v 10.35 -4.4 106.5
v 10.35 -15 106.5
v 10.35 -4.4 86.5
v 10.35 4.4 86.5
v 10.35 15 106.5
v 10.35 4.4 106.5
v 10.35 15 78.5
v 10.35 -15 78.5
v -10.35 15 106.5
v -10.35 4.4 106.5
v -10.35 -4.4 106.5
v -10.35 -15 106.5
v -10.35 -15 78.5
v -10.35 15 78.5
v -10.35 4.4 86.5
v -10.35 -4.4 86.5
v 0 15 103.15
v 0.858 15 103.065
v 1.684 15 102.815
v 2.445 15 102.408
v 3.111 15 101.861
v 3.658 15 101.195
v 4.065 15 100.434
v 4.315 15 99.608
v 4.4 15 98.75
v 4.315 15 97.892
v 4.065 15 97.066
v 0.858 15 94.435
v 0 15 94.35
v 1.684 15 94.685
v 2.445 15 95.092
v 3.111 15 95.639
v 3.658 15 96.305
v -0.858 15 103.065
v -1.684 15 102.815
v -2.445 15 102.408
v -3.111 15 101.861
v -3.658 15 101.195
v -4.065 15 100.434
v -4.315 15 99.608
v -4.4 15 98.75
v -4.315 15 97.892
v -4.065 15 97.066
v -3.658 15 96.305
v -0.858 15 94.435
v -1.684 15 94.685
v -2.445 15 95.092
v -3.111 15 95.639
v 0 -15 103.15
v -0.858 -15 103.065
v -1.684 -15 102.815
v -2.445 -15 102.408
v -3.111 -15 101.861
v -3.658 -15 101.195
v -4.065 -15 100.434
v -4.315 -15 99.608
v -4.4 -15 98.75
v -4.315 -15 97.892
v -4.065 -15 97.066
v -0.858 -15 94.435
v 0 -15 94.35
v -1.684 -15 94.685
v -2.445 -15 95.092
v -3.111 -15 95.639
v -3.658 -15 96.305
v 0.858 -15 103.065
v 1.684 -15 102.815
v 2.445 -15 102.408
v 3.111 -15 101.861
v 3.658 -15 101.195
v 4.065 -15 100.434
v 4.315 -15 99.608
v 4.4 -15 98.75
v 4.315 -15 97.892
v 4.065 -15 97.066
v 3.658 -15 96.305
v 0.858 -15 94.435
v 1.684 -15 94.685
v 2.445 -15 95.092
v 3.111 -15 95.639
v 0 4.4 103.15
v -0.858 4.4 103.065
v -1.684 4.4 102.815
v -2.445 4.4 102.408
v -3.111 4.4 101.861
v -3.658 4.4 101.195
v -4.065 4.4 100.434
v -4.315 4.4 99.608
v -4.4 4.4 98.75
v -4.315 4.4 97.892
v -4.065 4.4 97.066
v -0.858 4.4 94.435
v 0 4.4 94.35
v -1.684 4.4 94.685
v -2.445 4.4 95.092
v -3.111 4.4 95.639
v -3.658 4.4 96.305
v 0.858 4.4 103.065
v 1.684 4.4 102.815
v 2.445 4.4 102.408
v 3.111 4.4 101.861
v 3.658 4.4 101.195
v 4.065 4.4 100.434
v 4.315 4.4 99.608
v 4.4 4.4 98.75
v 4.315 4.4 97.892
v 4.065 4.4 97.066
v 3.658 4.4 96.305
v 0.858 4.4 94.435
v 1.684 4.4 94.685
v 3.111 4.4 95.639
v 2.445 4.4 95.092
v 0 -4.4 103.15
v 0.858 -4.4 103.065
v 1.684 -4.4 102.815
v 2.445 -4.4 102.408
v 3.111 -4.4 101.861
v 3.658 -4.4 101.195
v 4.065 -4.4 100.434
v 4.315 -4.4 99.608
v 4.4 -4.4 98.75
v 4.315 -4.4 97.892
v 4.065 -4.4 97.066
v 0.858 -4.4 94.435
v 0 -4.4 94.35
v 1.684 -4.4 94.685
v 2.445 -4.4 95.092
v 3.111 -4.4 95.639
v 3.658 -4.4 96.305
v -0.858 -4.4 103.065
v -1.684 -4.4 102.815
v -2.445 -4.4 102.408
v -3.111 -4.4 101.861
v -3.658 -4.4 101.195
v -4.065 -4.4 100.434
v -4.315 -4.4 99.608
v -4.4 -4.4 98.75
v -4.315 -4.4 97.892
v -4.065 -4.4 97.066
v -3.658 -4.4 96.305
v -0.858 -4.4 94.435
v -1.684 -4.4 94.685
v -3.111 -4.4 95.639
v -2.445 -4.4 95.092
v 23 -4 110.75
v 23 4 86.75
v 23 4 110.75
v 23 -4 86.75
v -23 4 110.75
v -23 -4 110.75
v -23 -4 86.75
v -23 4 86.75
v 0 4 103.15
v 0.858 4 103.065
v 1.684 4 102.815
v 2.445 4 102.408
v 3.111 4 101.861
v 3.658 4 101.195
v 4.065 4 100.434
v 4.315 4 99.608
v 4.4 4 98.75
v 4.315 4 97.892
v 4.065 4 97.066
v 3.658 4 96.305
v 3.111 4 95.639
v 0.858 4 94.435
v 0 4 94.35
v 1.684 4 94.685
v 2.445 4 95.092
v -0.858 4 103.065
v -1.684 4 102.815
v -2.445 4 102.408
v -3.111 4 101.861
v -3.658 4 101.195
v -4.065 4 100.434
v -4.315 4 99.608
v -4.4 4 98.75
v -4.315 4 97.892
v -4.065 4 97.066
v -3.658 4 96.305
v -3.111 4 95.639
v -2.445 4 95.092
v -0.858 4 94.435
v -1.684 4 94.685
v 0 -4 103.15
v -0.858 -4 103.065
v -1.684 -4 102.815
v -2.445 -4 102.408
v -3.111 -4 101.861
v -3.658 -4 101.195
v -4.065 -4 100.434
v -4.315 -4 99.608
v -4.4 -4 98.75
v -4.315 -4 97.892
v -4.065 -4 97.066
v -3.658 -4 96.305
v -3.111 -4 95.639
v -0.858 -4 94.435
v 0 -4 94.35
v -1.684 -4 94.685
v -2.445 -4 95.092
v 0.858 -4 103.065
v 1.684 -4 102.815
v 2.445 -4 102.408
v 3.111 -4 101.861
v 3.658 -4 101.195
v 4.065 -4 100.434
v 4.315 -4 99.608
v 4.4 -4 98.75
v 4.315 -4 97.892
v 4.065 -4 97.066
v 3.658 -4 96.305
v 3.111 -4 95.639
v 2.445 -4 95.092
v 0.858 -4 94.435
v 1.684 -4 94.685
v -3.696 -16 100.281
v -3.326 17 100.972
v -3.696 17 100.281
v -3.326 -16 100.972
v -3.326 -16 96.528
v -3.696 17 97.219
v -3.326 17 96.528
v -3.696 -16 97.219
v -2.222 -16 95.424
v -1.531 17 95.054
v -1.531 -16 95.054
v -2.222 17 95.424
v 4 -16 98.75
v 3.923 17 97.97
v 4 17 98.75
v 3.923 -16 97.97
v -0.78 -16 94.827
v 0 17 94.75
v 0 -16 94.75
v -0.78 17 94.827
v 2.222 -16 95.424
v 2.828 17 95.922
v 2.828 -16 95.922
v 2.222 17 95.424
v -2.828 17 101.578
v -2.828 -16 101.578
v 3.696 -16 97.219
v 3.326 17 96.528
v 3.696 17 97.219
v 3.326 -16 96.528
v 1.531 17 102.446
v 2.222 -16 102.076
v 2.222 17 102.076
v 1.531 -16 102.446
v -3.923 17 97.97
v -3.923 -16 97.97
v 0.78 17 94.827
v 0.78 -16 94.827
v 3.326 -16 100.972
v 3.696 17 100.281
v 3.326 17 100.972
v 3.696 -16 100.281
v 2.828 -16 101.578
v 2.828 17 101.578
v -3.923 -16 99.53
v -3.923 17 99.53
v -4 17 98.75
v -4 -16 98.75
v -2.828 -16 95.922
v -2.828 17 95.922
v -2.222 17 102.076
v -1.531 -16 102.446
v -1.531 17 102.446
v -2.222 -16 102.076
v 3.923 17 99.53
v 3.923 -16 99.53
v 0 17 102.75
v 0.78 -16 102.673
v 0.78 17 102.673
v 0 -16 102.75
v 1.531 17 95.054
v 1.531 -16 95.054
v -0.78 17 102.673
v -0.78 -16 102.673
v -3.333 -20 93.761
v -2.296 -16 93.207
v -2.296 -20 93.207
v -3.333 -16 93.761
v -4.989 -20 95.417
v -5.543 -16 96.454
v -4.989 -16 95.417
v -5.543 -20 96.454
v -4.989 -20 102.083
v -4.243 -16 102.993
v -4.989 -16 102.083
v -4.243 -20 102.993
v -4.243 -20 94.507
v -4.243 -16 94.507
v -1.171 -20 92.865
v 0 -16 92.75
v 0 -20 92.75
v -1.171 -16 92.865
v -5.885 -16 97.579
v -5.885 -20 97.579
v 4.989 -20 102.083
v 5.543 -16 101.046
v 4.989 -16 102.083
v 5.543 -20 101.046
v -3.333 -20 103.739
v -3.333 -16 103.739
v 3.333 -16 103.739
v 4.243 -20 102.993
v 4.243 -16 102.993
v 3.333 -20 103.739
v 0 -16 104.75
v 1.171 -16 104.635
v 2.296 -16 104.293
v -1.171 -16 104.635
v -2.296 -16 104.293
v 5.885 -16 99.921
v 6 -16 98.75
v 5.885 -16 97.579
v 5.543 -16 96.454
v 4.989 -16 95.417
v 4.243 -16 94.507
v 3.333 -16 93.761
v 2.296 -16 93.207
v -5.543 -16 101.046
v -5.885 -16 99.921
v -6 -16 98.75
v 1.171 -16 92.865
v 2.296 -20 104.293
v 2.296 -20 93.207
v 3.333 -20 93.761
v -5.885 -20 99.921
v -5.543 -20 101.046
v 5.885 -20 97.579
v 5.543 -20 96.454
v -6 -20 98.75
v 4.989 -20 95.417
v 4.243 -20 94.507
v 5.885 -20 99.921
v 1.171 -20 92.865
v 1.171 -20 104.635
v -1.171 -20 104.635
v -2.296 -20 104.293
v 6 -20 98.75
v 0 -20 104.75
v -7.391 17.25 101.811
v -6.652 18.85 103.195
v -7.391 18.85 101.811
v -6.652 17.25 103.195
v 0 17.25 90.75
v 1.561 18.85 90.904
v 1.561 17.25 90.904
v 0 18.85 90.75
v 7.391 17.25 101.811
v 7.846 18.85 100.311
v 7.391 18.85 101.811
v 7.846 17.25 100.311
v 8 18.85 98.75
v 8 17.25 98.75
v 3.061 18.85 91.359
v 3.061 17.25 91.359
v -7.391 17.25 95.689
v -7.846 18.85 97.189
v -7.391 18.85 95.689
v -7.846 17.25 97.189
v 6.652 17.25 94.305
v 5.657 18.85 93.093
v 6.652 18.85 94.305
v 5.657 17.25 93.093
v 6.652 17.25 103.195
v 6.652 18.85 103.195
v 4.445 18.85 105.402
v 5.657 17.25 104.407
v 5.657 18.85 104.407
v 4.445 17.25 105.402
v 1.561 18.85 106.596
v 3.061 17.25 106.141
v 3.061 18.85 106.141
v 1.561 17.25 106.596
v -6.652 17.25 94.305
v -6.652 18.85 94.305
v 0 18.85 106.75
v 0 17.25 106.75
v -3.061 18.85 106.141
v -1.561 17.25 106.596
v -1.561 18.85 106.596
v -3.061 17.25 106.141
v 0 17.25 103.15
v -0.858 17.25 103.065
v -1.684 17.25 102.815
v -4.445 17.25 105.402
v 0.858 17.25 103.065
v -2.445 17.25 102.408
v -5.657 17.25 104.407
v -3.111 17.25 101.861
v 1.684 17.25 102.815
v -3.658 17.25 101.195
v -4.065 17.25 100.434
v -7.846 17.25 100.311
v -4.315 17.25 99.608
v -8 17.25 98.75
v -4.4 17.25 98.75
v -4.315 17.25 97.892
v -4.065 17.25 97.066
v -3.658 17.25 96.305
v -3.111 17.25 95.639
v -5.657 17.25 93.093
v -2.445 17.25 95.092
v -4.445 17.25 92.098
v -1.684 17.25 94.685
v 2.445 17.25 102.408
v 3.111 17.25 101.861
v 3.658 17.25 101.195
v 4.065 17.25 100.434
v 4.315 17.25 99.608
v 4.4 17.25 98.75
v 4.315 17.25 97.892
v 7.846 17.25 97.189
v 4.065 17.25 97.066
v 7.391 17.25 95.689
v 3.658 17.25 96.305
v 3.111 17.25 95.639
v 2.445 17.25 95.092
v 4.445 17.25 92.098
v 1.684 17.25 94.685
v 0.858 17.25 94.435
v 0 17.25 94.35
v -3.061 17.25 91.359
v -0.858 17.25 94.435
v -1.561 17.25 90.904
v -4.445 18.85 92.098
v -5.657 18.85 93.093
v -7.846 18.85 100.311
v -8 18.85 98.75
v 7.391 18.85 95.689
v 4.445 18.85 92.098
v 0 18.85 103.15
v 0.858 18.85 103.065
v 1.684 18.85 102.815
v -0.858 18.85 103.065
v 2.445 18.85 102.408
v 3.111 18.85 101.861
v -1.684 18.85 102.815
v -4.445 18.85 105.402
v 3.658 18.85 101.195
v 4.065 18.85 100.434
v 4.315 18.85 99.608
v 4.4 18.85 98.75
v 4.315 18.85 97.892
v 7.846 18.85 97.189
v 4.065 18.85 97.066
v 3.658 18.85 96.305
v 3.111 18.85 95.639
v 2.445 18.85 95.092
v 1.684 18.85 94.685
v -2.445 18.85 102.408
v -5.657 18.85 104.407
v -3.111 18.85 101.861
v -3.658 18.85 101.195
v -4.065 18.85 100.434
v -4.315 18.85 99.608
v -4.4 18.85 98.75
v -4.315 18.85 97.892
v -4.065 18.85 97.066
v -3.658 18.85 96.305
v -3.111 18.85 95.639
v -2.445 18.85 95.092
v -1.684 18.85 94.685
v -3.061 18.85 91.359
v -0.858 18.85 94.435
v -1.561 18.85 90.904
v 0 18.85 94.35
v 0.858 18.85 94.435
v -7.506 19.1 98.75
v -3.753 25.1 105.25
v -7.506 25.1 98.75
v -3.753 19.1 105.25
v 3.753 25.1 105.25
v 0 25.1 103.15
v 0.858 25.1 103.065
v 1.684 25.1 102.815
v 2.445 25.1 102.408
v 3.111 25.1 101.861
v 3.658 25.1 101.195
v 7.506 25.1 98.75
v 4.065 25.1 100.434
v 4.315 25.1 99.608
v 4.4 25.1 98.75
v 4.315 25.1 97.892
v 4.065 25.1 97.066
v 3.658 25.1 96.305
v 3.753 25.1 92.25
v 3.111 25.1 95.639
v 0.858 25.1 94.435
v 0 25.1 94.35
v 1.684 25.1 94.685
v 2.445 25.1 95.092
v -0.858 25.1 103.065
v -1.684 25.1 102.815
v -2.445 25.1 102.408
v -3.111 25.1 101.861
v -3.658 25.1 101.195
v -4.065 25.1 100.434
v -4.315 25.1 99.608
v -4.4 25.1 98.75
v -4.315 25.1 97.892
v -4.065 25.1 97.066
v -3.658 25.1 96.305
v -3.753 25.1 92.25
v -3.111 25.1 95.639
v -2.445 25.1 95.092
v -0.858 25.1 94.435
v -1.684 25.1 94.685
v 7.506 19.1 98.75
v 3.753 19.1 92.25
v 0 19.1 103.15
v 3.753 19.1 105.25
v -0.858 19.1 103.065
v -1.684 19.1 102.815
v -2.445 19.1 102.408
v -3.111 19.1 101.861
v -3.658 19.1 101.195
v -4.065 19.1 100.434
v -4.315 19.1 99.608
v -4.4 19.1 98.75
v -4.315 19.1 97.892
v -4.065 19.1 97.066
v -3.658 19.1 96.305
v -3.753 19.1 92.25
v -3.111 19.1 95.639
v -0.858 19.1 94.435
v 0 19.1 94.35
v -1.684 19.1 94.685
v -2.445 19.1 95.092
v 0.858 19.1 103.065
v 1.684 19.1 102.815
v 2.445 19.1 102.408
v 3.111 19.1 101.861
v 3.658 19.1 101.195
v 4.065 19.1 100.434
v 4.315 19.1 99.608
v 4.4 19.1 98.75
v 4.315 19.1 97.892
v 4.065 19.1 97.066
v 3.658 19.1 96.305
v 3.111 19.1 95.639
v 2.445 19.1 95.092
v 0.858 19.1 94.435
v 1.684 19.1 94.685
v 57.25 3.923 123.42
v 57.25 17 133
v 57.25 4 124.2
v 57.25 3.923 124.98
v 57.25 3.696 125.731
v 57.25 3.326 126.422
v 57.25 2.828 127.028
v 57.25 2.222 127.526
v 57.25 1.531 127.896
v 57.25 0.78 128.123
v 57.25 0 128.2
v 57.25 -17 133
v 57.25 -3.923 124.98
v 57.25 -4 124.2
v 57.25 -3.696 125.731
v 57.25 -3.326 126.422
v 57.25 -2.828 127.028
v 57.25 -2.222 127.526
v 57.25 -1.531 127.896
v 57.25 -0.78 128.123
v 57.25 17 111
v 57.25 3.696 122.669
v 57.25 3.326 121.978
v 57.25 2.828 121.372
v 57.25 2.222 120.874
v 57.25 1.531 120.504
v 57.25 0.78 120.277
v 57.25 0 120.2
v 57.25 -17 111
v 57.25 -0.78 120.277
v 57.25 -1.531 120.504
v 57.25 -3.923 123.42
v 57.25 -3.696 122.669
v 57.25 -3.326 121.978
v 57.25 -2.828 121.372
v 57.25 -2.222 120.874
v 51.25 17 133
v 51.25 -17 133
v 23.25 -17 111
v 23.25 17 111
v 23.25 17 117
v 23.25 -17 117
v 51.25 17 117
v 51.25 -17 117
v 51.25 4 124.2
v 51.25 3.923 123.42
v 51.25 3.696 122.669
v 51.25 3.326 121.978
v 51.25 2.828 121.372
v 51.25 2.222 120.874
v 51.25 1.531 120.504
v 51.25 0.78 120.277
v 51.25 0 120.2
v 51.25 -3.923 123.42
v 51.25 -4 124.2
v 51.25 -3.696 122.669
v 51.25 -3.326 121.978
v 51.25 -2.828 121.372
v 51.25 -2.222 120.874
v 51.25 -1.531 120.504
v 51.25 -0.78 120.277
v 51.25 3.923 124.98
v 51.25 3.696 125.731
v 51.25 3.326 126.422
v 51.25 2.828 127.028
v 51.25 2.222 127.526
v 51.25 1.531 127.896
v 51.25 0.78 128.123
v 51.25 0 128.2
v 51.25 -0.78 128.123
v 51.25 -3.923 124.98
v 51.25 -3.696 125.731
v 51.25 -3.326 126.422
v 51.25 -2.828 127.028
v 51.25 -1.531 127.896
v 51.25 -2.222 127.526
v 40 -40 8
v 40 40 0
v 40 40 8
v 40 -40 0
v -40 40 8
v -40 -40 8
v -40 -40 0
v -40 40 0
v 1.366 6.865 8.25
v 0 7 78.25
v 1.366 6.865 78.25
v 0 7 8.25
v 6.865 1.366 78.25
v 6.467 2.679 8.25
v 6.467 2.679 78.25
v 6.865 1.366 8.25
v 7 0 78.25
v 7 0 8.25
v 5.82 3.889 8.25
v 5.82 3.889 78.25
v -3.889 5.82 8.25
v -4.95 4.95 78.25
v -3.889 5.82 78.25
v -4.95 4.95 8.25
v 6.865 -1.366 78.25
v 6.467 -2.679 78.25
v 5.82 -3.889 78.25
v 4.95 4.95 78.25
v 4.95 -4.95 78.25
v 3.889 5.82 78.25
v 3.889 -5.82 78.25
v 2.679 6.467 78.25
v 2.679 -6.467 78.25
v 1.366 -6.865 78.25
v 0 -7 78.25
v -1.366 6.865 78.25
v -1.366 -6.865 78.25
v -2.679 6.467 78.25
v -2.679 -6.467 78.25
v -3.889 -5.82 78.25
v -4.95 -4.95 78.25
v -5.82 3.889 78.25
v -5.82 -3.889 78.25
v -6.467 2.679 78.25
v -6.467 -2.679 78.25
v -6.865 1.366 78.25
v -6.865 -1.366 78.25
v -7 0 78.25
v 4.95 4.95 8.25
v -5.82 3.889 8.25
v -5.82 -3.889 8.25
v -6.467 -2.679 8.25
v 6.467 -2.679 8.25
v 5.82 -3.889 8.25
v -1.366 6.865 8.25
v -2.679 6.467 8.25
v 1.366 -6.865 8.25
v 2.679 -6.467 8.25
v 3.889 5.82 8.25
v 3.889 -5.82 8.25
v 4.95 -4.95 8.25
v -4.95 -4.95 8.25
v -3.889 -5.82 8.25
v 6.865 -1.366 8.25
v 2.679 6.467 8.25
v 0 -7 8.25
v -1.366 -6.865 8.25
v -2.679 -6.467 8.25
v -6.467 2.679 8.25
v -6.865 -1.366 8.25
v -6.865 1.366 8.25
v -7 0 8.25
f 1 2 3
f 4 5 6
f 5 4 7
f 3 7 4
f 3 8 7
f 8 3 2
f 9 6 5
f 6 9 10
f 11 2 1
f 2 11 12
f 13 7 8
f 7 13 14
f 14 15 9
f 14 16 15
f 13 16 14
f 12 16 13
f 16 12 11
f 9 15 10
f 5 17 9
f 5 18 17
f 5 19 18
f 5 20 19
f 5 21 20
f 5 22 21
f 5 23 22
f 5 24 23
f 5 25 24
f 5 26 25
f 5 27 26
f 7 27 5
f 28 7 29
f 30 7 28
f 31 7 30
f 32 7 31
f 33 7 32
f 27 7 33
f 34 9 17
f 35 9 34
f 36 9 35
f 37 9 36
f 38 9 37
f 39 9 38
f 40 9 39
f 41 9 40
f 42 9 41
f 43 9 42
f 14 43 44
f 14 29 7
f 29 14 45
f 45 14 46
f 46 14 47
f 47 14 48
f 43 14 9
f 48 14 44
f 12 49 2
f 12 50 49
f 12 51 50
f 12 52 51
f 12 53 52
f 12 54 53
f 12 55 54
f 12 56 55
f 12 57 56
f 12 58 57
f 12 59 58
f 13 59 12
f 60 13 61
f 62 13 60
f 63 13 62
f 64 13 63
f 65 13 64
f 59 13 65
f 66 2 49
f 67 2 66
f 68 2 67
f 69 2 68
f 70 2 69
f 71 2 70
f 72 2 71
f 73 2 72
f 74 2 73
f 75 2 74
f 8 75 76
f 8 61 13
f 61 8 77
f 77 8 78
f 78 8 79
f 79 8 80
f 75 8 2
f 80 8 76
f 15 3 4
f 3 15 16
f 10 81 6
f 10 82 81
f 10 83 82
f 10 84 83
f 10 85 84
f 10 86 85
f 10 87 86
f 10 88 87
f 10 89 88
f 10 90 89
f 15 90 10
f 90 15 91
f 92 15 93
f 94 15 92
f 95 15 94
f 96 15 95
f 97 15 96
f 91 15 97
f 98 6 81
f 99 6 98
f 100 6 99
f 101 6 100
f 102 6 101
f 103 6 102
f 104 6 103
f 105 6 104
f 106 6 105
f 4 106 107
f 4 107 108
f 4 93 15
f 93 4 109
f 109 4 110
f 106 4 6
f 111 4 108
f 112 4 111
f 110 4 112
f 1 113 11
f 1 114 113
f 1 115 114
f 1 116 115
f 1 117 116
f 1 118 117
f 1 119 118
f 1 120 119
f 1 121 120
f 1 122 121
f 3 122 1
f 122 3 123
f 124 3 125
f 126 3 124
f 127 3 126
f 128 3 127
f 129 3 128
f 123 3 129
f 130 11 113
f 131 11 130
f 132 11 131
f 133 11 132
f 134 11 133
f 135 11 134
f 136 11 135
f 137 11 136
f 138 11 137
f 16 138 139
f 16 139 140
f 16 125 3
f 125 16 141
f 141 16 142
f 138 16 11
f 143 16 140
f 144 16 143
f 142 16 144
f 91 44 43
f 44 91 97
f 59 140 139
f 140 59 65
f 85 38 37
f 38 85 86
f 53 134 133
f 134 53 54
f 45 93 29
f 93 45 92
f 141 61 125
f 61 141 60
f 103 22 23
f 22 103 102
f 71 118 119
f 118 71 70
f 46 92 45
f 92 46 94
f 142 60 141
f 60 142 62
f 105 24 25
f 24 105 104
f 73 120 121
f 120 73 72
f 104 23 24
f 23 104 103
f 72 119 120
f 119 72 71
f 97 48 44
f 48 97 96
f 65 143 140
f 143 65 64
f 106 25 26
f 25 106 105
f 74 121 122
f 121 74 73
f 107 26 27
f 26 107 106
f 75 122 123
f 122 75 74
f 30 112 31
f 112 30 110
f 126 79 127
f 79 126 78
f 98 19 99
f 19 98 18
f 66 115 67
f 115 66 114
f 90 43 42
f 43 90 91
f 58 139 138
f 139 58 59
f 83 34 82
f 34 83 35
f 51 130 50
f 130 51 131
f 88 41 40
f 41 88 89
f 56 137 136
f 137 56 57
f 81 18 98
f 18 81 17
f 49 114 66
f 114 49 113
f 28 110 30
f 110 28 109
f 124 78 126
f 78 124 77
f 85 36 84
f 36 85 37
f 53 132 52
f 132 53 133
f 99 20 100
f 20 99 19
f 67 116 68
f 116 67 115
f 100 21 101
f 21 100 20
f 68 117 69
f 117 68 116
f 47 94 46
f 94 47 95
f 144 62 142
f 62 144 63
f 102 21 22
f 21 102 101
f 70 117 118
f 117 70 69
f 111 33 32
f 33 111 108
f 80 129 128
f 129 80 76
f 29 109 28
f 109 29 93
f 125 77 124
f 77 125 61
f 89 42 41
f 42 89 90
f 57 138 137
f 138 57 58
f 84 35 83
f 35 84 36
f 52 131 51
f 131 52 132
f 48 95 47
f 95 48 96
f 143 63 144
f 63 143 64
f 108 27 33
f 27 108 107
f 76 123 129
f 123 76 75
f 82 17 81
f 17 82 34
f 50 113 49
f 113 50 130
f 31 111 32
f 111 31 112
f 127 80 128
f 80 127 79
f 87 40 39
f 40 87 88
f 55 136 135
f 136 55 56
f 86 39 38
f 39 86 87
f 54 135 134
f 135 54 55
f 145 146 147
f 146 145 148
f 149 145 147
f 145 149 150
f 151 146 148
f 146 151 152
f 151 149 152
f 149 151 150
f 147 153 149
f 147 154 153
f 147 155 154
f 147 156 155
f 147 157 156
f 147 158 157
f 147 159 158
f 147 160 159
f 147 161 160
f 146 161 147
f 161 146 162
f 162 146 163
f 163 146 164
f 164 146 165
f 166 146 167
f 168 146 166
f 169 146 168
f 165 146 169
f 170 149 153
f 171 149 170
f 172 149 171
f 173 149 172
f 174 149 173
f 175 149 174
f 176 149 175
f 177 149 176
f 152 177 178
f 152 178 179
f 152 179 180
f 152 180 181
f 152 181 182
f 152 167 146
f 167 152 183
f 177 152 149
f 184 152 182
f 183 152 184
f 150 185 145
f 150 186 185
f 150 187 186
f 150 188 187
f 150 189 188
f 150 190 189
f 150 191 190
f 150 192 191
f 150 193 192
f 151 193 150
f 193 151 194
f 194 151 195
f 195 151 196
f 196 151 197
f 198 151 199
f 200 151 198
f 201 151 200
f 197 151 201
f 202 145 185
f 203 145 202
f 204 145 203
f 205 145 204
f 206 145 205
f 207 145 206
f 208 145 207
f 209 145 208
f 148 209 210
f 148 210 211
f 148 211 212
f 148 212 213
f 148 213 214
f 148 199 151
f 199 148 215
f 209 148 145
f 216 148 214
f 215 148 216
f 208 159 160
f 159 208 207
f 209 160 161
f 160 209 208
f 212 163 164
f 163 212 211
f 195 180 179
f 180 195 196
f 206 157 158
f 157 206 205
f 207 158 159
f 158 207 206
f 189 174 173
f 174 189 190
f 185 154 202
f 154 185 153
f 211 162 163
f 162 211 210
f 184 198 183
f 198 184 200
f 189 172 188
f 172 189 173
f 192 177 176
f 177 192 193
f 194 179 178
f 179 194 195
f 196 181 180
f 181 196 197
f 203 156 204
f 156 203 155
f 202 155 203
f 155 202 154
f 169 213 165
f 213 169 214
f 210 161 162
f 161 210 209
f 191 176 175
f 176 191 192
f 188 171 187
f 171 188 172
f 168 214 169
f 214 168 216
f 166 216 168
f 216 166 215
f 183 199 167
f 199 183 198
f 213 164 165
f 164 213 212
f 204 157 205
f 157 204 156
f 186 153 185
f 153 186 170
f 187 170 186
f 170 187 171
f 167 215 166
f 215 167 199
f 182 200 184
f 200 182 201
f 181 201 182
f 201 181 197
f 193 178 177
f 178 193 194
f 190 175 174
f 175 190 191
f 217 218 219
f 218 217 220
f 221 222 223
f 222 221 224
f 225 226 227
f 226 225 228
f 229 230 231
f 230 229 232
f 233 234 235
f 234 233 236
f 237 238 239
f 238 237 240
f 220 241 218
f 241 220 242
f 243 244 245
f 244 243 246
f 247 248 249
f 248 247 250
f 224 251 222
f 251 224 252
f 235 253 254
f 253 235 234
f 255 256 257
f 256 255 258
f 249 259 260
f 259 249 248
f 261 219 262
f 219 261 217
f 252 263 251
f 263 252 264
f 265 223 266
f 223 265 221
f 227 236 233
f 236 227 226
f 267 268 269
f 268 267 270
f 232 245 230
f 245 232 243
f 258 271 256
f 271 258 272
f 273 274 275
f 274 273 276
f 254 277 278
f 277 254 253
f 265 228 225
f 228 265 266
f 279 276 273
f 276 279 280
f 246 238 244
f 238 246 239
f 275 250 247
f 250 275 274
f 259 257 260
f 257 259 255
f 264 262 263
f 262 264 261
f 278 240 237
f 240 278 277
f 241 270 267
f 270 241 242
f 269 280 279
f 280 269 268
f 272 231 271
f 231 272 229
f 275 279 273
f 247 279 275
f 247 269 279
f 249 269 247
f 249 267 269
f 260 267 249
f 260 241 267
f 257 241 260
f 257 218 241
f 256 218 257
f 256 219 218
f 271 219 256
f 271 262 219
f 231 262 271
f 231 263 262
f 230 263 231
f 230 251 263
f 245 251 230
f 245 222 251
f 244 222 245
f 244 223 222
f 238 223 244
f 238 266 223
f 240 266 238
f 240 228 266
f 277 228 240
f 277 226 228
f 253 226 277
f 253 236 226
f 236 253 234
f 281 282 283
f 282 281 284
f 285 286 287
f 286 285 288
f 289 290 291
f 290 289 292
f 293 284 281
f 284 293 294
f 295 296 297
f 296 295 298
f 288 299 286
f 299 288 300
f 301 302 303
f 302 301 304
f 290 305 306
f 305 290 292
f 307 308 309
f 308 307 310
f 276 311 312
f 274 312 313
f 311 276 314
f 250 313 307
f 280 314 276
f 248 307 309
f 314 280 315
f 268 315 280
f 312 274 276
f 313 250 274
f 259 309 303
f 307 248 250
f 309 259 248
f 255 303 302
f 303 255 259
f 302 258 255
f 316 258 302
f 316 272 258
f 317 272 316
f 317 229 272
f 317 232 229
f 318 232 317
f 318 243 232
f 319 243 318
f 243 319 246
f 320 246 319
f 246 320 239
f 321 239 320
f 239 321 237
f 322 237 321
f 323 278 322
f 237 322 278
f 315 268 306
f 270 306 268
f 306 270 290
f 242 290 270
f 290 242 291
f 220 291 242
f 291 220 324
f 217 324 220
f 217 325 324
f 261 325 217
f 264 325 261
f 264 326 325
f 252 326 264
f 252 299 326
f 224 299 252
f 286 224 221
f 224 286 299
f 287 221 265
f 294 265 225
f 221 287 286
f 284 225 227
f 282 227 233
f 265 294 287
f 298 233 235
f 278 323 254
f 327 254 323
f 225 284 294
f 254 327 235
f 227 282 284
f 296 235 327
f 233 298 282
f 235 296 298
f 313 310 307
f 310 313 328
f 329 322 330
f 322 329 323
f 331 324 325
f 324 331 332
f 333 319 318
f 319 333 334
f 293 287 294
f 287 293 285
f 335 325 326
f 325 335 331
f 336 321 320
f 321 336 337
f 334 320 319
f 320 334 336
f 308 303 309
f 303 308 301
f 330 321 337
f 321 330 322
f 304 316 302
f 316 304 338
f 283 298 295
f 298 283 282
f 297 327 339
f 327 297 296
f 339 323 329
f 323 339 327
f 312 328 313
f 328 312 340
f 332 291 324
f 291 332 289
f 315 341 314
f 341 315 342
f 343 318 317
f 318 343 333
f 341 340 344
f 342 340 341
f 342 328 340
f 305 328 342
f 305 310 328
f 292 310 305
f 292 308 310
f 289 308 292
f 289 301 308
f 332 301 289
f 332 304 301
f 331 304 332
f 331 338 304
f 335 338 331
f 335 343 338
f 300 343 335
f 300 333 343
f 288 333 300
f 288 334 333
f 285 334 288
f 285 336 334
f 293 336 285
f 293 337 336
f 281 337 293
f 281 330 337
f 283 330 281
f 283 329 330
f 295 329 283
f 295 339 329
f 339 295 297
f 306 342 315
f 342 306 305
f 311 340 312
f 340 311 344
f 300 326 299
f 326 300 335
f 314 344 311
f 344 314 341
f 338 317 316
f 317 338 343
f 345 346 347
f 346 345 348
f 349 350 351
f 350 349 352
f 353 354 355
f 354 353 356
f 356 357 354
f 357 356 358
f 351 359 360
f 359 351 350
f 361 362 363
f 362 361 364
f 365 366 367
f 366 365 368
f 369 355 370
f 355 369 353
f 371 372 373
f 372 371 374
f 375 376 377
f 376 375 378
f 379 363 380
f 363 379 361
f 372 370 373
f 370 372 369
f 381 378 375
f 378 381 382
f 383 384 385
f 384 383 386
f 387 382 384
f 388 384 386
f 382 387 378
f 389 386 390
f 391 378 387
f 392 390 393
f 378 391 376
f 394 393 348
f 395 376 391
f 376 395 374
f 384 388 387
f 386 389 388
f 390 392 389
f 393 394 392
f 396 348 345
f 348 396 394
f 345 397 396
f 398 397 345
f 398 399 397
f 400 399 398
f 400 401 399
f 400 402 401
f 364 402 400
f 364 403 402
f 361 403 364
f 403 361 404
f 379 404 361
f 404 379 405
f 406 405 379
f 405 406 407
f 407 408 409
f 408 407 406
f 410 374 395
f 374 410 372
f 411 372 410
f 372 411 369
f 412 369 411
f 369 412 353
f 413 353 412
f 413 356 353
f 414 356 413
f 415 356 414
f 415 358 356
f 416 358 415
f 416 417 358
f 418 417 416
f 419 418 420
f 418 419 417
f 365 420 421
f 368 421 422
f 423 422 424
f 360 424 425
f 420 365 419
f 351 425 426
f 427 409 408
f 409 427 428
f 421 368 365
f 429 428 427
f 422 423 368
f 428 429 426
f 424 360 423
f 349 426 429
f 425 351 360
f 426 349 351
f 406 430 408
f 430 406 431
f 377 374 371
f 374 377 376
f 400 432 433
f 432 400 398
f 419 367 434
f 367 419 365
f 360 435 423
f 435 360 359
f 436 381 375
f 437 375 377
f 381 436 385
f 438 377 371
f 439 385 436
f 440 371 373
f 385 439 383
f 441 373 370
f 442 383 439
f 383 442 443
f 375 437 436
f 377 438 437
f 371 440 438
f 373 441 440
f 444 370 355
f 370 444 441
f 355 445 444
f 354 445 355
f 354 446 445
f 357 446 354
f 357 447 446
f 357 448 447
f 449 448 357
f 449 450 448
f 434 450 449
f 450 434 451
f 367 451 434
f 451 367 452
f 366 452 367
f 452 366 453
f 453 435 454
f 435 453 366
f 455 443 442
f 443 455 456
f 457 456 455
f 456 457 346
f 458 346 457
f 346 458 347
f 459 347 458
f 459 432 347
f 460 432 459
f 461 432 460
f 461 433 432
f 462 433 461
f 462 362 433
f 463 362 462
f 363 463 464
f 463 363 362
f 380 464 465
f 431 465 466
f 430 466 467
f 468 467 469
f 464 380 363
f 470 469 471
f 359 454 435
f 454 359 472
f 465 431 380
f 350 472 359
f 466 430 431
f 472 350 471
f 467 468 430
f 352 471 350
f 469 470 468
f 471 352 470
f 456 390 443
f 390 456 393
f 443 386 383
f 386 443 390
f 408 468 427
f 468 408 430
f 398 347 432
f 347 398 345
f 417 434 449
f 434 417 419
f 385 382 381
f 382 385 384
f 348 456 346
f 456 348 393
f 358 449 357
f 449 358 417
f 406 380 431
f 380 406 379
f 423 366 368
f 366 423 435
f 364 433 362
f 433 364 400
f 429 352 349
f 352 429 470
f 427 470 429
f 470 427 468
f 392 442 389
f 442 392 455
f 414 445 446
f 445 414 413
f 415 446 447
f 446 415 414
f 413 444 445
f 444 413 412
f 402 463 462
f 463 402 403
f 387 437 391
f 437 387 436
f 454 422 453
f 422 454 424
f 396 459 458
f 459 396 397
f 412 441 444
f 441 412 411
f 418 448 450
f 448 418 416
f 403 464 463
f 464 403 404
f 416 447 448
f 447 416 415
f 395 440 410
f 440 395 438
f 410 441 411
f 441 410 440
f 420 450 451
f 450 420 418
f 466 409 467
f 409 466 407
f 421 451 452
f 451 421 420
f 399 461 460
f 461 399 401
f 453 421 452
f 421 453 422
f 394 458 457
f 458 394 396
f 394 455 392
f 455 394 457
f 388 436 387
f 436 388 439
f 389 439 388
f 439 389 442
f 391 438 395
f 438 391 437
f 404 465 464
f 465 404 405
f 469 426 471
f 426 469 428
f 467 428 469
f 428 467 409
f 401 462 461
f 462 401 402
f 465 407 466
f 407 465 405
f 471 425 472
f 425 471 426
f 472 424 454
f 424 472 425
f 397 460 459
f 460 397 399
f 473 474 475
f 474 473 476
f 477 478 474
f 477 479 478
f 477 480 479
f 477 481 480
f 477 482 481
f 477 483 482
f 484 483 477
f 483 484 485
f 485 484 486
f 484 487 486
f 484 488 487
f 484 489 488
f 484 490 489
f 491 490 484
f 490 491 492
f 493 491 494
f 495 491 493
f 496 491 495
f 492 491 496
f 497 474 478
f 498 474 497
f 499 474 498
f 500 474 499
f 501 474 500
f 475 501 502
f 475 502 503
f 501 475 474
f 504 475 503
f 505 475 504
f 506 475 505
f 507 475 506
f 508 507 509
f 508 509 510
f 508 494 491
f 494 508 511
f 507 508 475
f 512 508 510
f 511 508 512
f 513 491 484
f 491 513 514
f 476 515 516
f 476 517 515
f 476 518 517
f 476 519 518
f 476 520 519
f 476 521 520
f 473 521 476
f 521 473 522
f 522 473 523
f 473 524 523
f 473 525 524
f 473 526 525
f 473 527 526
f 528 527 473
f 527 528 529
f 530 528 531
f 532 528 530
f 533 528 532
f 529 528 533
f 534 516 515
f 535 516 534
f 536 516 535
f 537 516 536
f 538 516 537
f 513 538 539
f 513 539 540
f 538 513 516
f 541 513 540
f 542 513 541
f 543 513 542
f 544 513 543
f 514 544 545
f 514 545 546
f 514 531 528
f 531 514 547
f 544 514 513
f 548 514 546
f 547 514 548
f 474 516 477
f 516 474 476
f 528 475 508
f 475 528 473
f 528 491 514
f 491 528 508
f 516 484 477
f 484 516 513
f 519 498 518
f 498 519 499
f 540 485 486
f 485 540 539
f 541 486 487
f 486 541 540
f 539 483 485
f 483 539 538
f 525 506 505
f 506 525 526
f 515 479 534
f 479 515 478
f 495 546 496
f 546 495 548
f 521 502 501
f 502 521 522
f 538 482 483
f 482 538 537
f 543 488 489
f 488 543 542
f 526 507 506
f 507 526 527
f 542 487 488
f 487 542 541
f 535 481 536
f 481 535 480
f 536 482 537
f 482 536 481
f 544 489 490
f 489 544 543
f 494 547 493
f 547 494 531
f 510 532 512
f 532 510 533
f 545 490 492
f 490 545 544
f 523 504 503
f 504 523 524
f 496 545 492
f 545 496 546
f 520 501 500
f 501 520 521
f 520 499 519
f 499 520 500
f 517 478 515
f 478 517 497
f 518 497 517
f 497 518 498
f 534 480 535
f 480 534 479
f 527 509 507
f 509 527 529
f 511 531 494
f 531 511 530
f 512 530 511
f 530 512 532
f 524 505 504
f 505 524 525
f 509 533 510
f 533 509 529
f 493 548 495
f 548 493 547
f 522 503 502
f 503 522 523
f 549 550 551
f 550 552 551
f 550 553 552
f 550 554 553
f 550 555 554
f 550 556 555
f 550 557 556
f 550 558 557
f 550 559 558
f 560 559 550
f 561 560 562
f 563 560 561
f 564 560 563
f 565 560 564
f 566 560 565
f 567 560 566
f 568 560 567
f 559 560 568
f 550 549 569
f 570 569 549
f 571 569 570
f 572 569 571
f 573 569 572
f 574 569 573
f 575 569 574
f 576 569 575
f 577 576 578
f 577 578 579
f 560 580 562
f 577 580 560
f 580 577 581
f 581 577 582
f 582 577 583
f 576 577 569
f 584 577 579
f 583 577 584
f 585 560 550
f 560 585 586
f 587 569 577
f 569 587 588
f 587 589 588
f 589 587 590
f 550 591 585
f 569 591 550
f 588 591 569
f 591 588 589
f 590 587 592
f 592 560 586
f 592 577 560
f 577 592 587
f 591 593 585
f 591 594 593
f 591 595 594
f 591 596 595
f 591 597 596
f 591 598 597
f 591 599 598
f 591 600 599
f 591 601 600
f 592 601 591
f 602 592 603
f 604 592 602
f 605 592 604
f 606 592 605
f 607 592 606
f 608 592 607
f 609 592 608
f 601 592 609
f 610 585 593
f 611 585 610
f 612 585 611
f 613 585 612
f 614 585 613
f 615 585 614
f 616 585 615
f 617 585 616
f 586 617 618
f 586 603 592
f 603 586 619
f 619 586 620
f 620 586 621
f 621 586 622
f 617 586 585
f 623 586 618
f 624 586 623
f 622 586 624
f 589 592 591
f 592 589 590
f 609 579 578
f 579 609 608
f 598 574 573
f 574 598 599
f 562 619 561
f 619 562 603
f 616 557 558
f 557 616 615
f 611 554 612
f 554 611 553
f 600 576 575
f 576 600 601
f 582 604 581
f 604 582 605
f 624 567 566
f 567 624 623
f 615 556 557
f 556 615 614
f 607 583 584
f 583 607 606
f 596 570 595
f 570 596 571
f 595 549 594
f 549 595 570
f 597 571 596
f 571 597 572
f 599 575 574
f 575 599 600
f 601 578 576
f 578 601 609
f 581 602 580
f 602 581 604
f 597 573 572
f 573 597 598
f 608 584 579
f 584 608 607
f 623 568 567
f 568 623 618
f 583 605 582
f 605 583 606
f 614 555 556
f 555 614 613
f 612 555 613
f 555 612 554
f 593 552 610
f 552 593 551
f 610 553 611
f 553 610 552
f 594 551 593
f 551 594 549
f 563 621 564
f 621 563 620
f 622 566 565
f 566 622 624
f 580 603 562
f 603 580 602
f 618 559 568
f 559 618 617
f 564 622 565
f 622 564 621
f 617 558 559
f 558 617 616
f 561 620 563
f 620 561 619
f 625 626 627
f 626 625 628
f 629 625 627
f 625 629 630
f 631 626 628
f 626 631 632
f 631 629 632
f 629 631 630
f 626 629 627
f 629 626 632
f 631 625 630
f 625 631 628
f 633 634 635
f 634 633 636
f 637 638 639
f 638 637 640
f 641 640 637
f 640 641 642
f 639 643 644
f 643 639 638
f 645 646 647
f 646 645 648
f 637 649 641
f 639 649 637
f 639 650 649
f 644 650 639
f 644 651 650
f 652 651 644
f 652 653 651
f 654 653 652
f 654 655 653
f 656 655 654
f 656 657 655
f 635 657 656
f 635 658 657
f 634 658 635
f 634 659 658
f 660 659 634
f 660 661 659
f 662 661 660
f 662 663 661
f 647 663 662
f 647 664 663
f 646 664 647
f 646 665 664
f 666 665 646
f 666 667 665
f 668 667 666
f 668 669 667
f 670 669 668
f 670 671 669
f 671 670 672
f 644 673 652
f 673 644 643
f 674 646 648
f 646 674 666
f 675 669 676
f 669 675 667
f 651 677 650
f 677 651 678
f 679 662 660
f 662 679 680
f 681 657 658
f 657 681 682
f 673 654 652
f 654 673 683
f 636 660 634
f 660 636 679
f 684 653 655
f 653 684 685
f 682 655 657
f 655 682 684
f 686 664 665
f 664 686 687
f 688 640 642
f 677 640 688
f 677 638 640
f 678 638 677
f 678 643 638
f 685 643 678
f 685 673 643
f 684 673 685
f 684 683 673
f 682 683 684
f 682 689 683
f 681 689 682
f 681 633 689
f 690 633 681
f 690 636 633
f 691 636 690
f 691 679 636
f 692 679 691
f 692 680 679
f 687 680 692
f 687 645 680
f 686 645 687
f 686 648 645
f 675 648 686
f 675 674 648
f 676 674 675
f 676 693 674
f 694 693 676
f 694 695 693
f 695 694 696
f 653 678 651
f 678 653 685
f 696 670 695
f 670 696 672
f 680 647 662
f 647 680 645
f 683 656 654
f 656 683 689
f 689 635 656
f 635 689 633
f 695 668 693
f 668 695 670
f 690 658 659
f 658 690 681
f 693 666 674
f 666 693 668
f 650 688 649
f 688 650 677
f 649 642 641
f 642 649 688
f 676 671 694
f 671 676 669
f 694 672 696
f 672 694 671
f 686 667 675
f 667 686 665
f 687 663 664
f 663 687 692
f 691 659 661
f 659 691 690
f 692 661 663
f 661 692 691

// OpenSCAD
$fn = 32;

// ------------------------------------------------------------------------
// Lamp arm: column d14 x 70 mm, arm 46 mm
// Every part is its own module, assembly() places every instance.
// ------------------------------------------------------------------------

// --- part 1 ---
module lamp_base() {
  difference() {
    translate([-40, -40, 0]) cube([80, 80, 8]);
  }
}

// --- part 2 ---
module lamp_column() {
  cylinder(h = 70, d = 14);
}

// --- part 3 ---
module head_fork() {
  difference() {
    translate([-10.35, -15, 0]) cube([20.7, 30, 28]);
    translate([-11.35, -4.4, 8]) cube([22.7, 8.8, 21]);
    translate([0, 0, 20.25]) rotate([90, 0, 0]) cylinder(h = 32, d = 8.8, center = true);
  }
}

// --- part 4 ---
module lamp_arm() {
  difference() {
    translate([-23, -4, 0]) cube([46, 8, 24]);
    translate([0, 0, 12]) rotate([90, 0, 0]) cylinder(h = 10, d = 8.8, center = true);
  }
}

// --- part 5 ---
module arm_pin() {
  rotate([0, 90, 0]) cylinder(h = 34, d = 8, center = true);
  translate([-20, 0, 0]) rotate([0, 90, 0]) cylinder(h = 4, d = 12);
}

// --- part 6 ---
module arm_washer() {
  difference() {
      translate([0, 0, 0]) cylinder(h = 1.6, d = 16);
      translate([0, 0, -1]) cylinder(h = 3.6, d = 8.8);
    }
}

// --- part 7 ---
module arm_nut() {
  difference() {
    linear_extrude(height = 6) polygon(points = [[7.506, 0], [3.753, 6.5], [-3.753, 6.5], [-7.506, 0], [-3.753, -6.5], [3.753, -6.5]]);
    translate([0, 0, -1]) cylinder(h = 8, d = 8.8);
  }
}

// --- part 8 ---
module shade_bracket() {
  difference() {
    translate([-17, -17, 0]) cube([34, 34, 22]);
    translate([-18, -18, 6]) cube([29, 36, 17]);
    translate([14, 0, 13.2]) rotate([0, 90, 0]) cylinder(h = 8, d = 8, center = true);
  }
}

// --- assembly ---
module assembly() {
  color([0.80, 0.24, 0.20]) translate([0, 0, 0]) rotate([0, 0, 0]) lamp_base();
  color([0.20, 0.45, 0.75]) translate([0, 0, 8.25]) rotate([0, 0, 0]) lamp_column();
  color([0.25, 0.62, 0.32]) translate([0, 0, 78.5]) rotate([0, 0, 0]) head_fork();
  color([0.92, 0.70, 0.18]) translate([0, 0, 86.75]) rotate([0, 0, 0]) lamp_arm();
  color([0.58, 0.35, 0.70]) translate([0, 0, 98.75]) rotate([0, 0, 90]) arm_pin();
  color([0.16, 0.66, 0.66]) translate([0, 18.85, 98.75]) rotate([90, 0, 0]) arm_washer();
  color([0.85, 0.48, 0.18]) translate([0, 25.1, 98.75]) rotate([90, 0, 0]) arm_nut();
  color([0.55, 0.60, 0.65]) translate([40.25, 0, 111]) rotate([0, 0, 0]) shade_bracket();
}

assembly();
